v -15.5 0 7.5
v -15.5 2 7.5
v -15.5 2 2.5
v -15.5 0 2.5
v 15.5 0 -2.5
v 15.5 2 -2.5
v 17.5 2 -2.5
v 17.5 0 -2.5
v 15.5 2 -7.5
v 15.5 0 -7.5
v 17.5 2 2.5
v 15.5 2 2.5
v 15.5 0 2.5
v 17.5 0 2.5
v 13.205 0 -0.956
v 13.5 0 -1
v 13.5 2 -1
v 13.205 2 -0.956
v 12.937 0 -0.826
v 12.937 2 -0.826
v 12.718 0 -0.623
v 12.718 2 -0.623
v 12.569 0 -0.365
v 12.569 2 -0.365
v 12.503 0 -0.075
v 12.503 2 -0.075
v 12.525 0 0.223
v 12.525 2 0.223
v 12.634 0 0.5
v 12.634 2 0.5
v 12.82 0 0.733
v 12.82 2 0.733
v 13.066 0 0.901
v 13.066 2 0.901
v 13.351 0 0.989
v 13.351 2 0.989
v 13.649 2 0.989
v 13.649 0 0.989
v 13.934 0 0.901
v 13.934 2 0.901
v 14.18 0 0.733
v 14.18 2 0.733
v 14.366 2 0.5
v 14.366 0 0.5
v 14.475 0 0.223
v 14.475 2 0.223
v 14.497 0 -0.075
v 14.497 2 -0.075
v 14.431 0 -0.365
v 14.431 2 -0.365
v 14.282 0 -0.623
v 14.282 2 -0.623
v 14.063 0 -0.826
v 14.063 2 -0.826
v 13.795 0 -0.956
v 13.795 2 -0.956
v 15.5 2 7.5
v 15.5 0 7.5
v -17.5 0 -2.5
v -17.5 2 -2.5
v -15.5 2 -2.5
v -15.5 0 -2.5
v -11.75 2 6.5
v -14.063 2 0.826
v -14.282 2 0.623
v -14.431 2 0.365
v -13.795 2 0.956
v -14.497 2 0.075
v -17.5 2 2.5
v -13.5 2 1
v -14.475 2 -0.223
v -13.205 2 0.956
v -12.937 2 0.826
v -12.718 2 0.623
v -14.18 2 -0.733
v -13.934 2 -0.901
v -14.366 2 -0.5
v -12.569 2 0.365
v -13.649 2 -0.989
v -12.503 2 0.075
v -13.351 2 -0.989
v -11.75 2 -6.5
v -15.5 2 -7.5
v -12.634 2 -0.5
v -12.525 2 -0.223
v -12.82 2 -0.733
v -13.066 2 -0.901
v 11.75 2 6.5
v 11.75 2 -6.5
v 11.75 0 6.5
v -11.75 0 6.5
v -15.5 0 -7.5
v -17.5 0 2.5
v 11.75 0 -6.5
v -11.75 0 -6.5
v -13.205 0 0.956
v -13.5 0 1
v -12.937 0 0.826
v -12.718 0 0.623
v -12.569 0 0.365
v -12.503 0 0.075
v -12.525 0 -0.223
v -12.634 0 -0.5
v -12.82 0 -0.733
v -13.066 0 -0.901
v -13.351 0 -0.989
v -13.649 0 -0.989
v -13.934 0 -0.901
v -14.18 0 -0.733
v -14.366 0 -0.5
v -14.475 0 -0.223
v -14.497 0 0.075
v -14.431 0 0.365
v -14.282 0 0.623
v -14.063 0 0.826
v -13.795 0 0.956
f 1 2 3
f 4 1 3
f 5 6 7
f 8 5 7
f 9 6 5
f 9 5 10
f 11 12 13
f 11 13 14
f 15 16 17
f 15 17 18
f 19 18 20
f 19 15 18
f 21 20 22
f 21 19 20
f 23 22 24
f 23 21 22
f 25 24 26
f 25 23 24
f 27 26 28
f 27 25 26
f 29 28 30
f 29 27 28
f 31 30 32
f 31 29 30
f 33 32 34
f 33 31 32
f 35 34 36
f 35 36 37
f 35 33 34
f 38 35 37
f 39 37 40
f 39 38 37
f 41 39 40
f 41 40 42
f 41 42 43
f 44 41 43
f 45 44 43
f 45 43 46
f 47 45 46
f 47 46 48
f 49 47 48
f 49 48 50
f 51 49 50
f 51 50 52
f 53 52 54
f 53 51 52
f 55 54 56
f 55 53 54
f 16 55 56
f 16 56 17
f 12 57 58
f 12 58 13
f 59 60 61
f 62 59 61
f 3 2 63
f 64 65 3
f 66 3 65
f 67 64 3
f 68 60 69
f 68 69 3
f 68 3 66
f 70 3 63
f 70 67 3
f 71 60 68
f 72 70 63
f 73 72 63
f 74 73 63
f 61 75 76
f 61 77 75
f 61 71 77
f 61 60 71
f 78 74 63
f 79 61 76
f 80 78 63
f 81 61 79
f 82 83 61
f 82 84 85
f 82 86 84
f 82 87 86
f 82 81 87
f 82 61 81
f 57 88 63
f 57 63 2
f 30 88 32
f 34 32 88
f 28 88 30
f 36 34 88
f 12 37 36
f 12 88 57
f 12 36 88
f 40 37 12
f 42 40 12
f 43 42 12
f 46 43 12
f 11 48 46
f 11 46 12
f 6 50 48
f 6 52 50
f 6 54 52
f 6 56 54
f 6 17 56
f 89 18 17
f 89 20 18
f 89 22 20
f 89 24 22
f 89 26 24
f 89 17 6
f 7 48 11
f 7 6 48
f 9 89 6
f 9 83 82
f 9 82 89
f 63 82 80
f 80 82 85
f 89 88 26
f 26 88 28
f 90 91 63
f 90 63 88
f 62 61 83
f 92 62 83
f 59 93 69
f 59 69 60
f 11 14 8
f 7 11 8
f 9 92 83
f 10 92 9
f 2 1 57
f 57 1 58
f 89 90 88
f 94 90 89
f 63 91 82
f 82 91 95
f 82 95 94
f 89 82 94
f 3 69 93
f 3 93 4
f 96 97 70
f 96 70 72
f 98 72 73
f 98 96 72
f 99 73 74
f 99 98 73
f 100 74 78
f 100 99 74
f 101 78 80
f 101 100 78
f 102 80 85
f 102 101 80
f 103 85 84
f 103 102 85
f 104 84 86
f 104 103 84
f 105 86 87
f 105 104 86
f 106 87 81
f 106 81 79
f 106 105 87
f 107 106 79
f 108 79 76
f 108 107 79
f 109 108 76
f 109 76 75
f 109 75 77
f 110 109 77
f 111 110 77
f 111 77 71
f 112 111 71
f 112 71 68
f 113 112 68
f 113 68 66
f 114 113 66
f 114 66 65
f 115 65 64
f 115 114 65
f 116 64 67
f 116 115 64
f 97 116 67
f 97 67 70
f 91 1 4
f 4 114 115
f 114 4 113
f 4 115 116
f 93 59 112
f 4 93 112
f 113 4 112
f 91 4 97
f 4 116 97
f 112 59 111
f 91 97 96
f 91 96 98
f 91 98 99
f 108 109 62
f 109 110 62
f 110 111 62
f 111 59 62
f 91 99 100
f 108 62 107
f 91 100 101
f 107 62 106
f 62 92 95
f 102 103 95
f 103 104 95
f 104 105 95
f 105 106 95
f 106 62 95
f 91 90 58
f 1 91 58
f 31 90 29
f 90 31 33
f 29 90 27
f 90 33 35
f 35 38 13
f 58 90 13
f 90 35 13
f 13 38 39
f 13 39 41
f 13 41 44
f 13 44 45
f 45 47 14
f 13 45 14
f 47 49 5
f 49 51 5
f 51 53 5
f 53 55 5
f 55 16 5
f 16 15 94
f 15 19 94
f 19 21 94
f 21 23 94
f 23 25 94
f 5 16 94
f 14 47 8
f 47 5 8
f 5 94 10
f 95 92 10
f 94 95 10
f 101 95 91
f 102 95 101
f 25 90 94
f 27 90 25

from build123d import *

# Parameters (mm, degrees)
SKETCH1_W           = 35
SKETCH1_H           = 15
SKETCH1_R           = 1
SKETCH1_W_2         = 23.5
SKETCH1_H_2         = 13
BOSS_EXTRUDE1_DEPTH = 2
SKETCH2_W           = 2
SKETCH2_H           = 5
CUT_EXTRUDE1_DEPTH  = 2


with BuildPart() as part:
    # Sketch1 → Boss-Extrude1 (new body)
    with BuildSketch(Plane(origin=(0, 0, 0), x_dir=(1, 0, 0), z_dir=(0, 1, 0))):
        Rectangle(SKETCH1_W, SKETCH1_H)
        with Locations(Location((-13.5, 0, 0), (0, 0, 270))):
            Circle(SKETCH1_R, mode=Mode.SUBTRACT)
        with Locations(Location((13.5, 0, 0), (0, 0, 90))):
            Circle(SKETCH1_R, mode=Mode.SUBTRACT)
        Rectangle(SKETCH1_W_2, SKETCH1_H_2, mode=Mode.SUBTRACT)
    extrude(amount=BOSS_EXTRUDE1_DEPTH)

    # Sketch2 → Cut-Extrude1 (cut)
    with BuildSketch(Plane(origin=(0, 2, 0), x_dir=(1, 0, 0), z_dir=(0, 1, 0))):
        with Locations((16.5, 5)):
            Rectangle(SKETCH2_W, SKETCH2_H)
        with Locations((16.5, -5)):
            Rectangle(SKETCH2_W, SKETCH2_H)
        with Locations((-16.5, -5)):
            Rectangle(SKETCH2_W, SKETCH2_H)
        with Locations((-16.5, 5)):
            Rectangle(SKETCH2_W, SKETCH2_H)
    extrude(amount=-CUT_EXTRUDE1_DEPTH, mode=Mode.SUBTRACT)


solid = part.part
